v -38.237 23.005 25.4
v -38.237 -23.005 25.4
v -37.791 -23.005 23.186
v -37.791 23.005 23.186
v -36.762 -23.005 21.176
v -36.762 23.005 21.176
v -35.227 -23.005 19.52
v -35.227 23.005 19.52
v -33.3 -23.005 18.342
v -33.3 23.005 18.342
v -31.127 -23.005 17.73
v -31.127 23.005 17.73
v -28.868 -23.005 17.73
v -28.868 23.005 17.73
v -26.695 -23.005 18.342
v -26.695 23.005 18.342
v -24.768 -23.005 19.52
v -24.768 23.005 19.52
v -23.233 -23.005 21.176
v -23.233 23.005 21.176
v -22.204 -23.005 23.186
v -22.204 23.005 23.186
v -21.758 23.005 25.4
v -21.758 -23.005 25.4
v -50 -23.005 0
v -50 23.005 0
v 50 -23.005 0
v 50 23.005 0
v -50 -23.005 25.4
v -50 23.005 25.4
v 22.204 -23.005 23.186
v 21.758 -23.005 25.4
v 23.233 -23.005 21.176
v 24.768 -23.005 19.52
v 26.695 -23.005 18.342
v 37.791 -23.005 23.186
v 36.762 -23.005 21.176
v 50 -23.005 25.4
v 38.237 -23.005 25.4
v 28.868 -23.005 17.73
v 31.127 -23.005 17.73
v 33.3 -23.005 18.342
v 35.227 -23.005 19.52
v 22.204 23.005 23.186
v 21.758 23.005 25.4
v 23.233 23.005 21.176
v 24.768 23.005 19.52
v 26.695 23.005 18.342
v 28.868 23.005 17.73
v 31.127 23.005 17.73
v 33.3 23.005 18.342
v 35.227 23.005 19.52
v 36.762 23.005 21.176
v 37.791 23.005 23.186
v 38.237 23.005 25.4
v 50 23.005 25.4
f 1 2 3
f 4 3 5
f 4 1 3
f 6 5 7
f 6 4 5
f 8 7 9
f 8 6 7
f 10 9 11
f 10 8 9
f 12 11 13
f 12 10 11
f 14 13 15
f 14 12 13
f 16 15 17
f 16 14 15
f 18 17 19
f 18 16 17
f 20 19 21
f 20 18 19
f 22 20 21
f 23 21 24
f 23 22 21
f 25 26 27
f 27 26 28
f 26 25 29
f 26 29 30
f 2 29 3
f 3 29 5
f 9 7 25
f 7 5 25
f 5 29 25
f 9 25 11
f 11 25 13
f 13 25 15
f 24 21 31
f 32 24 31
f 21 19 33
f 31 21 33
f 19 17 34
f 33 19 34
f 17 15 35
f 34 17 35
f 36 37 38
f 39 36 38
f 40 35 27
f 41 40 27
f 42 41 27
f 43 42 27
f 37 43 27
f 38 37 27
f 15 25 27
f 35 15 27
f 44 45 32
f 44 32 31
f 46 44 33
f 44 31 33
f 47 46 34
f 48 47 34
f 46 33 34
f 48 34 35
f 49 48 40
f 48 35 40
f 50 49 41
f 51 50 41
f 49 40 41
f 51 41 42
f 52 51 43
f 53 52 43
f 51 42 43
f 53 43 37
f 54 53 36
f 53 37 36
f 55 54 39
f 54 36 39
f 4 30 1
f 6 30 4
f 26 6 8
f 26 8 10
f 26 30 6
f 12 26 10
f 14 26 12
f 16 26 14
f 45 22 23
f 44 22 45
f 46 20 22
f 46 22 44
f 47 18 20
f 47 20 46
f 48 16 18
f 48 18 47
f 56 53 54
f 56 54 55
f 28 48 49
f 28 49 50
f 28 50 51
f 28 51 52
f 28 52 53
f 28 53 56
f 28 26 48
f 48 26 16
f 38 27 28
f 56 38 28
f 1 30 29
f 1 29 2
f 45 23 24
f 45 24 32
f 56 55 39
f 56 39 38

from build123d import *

# Parameters (mm, degrees)
F0_W     = 99.9998
F0_H     = 46.00928
F1_DEPTH = 25.4
F2_R     = 8.255
F3_DEPTH = 127


with BuildPart() as f1:
    # F0 (on Top) → F1 (new body)
    with BuildSketch(Plane.XY):
        Rectangle(F0_W, F0_H)
    extrude(amount=F1_DEPTH)

    # F2 (on Front) → F3 (cut, symmetric)
    with BuildSketch(Plane.XZ):
        with Locations((-29.9974, 25.907155)):
            Circle(F2_R)
        with Locations((29.9974, 25.907155)):
            Circle(F2_R)
    extrude(amount=F3_DEPTH, both=True, mode=Mode.SUBTRACT)


solid = f1.part
